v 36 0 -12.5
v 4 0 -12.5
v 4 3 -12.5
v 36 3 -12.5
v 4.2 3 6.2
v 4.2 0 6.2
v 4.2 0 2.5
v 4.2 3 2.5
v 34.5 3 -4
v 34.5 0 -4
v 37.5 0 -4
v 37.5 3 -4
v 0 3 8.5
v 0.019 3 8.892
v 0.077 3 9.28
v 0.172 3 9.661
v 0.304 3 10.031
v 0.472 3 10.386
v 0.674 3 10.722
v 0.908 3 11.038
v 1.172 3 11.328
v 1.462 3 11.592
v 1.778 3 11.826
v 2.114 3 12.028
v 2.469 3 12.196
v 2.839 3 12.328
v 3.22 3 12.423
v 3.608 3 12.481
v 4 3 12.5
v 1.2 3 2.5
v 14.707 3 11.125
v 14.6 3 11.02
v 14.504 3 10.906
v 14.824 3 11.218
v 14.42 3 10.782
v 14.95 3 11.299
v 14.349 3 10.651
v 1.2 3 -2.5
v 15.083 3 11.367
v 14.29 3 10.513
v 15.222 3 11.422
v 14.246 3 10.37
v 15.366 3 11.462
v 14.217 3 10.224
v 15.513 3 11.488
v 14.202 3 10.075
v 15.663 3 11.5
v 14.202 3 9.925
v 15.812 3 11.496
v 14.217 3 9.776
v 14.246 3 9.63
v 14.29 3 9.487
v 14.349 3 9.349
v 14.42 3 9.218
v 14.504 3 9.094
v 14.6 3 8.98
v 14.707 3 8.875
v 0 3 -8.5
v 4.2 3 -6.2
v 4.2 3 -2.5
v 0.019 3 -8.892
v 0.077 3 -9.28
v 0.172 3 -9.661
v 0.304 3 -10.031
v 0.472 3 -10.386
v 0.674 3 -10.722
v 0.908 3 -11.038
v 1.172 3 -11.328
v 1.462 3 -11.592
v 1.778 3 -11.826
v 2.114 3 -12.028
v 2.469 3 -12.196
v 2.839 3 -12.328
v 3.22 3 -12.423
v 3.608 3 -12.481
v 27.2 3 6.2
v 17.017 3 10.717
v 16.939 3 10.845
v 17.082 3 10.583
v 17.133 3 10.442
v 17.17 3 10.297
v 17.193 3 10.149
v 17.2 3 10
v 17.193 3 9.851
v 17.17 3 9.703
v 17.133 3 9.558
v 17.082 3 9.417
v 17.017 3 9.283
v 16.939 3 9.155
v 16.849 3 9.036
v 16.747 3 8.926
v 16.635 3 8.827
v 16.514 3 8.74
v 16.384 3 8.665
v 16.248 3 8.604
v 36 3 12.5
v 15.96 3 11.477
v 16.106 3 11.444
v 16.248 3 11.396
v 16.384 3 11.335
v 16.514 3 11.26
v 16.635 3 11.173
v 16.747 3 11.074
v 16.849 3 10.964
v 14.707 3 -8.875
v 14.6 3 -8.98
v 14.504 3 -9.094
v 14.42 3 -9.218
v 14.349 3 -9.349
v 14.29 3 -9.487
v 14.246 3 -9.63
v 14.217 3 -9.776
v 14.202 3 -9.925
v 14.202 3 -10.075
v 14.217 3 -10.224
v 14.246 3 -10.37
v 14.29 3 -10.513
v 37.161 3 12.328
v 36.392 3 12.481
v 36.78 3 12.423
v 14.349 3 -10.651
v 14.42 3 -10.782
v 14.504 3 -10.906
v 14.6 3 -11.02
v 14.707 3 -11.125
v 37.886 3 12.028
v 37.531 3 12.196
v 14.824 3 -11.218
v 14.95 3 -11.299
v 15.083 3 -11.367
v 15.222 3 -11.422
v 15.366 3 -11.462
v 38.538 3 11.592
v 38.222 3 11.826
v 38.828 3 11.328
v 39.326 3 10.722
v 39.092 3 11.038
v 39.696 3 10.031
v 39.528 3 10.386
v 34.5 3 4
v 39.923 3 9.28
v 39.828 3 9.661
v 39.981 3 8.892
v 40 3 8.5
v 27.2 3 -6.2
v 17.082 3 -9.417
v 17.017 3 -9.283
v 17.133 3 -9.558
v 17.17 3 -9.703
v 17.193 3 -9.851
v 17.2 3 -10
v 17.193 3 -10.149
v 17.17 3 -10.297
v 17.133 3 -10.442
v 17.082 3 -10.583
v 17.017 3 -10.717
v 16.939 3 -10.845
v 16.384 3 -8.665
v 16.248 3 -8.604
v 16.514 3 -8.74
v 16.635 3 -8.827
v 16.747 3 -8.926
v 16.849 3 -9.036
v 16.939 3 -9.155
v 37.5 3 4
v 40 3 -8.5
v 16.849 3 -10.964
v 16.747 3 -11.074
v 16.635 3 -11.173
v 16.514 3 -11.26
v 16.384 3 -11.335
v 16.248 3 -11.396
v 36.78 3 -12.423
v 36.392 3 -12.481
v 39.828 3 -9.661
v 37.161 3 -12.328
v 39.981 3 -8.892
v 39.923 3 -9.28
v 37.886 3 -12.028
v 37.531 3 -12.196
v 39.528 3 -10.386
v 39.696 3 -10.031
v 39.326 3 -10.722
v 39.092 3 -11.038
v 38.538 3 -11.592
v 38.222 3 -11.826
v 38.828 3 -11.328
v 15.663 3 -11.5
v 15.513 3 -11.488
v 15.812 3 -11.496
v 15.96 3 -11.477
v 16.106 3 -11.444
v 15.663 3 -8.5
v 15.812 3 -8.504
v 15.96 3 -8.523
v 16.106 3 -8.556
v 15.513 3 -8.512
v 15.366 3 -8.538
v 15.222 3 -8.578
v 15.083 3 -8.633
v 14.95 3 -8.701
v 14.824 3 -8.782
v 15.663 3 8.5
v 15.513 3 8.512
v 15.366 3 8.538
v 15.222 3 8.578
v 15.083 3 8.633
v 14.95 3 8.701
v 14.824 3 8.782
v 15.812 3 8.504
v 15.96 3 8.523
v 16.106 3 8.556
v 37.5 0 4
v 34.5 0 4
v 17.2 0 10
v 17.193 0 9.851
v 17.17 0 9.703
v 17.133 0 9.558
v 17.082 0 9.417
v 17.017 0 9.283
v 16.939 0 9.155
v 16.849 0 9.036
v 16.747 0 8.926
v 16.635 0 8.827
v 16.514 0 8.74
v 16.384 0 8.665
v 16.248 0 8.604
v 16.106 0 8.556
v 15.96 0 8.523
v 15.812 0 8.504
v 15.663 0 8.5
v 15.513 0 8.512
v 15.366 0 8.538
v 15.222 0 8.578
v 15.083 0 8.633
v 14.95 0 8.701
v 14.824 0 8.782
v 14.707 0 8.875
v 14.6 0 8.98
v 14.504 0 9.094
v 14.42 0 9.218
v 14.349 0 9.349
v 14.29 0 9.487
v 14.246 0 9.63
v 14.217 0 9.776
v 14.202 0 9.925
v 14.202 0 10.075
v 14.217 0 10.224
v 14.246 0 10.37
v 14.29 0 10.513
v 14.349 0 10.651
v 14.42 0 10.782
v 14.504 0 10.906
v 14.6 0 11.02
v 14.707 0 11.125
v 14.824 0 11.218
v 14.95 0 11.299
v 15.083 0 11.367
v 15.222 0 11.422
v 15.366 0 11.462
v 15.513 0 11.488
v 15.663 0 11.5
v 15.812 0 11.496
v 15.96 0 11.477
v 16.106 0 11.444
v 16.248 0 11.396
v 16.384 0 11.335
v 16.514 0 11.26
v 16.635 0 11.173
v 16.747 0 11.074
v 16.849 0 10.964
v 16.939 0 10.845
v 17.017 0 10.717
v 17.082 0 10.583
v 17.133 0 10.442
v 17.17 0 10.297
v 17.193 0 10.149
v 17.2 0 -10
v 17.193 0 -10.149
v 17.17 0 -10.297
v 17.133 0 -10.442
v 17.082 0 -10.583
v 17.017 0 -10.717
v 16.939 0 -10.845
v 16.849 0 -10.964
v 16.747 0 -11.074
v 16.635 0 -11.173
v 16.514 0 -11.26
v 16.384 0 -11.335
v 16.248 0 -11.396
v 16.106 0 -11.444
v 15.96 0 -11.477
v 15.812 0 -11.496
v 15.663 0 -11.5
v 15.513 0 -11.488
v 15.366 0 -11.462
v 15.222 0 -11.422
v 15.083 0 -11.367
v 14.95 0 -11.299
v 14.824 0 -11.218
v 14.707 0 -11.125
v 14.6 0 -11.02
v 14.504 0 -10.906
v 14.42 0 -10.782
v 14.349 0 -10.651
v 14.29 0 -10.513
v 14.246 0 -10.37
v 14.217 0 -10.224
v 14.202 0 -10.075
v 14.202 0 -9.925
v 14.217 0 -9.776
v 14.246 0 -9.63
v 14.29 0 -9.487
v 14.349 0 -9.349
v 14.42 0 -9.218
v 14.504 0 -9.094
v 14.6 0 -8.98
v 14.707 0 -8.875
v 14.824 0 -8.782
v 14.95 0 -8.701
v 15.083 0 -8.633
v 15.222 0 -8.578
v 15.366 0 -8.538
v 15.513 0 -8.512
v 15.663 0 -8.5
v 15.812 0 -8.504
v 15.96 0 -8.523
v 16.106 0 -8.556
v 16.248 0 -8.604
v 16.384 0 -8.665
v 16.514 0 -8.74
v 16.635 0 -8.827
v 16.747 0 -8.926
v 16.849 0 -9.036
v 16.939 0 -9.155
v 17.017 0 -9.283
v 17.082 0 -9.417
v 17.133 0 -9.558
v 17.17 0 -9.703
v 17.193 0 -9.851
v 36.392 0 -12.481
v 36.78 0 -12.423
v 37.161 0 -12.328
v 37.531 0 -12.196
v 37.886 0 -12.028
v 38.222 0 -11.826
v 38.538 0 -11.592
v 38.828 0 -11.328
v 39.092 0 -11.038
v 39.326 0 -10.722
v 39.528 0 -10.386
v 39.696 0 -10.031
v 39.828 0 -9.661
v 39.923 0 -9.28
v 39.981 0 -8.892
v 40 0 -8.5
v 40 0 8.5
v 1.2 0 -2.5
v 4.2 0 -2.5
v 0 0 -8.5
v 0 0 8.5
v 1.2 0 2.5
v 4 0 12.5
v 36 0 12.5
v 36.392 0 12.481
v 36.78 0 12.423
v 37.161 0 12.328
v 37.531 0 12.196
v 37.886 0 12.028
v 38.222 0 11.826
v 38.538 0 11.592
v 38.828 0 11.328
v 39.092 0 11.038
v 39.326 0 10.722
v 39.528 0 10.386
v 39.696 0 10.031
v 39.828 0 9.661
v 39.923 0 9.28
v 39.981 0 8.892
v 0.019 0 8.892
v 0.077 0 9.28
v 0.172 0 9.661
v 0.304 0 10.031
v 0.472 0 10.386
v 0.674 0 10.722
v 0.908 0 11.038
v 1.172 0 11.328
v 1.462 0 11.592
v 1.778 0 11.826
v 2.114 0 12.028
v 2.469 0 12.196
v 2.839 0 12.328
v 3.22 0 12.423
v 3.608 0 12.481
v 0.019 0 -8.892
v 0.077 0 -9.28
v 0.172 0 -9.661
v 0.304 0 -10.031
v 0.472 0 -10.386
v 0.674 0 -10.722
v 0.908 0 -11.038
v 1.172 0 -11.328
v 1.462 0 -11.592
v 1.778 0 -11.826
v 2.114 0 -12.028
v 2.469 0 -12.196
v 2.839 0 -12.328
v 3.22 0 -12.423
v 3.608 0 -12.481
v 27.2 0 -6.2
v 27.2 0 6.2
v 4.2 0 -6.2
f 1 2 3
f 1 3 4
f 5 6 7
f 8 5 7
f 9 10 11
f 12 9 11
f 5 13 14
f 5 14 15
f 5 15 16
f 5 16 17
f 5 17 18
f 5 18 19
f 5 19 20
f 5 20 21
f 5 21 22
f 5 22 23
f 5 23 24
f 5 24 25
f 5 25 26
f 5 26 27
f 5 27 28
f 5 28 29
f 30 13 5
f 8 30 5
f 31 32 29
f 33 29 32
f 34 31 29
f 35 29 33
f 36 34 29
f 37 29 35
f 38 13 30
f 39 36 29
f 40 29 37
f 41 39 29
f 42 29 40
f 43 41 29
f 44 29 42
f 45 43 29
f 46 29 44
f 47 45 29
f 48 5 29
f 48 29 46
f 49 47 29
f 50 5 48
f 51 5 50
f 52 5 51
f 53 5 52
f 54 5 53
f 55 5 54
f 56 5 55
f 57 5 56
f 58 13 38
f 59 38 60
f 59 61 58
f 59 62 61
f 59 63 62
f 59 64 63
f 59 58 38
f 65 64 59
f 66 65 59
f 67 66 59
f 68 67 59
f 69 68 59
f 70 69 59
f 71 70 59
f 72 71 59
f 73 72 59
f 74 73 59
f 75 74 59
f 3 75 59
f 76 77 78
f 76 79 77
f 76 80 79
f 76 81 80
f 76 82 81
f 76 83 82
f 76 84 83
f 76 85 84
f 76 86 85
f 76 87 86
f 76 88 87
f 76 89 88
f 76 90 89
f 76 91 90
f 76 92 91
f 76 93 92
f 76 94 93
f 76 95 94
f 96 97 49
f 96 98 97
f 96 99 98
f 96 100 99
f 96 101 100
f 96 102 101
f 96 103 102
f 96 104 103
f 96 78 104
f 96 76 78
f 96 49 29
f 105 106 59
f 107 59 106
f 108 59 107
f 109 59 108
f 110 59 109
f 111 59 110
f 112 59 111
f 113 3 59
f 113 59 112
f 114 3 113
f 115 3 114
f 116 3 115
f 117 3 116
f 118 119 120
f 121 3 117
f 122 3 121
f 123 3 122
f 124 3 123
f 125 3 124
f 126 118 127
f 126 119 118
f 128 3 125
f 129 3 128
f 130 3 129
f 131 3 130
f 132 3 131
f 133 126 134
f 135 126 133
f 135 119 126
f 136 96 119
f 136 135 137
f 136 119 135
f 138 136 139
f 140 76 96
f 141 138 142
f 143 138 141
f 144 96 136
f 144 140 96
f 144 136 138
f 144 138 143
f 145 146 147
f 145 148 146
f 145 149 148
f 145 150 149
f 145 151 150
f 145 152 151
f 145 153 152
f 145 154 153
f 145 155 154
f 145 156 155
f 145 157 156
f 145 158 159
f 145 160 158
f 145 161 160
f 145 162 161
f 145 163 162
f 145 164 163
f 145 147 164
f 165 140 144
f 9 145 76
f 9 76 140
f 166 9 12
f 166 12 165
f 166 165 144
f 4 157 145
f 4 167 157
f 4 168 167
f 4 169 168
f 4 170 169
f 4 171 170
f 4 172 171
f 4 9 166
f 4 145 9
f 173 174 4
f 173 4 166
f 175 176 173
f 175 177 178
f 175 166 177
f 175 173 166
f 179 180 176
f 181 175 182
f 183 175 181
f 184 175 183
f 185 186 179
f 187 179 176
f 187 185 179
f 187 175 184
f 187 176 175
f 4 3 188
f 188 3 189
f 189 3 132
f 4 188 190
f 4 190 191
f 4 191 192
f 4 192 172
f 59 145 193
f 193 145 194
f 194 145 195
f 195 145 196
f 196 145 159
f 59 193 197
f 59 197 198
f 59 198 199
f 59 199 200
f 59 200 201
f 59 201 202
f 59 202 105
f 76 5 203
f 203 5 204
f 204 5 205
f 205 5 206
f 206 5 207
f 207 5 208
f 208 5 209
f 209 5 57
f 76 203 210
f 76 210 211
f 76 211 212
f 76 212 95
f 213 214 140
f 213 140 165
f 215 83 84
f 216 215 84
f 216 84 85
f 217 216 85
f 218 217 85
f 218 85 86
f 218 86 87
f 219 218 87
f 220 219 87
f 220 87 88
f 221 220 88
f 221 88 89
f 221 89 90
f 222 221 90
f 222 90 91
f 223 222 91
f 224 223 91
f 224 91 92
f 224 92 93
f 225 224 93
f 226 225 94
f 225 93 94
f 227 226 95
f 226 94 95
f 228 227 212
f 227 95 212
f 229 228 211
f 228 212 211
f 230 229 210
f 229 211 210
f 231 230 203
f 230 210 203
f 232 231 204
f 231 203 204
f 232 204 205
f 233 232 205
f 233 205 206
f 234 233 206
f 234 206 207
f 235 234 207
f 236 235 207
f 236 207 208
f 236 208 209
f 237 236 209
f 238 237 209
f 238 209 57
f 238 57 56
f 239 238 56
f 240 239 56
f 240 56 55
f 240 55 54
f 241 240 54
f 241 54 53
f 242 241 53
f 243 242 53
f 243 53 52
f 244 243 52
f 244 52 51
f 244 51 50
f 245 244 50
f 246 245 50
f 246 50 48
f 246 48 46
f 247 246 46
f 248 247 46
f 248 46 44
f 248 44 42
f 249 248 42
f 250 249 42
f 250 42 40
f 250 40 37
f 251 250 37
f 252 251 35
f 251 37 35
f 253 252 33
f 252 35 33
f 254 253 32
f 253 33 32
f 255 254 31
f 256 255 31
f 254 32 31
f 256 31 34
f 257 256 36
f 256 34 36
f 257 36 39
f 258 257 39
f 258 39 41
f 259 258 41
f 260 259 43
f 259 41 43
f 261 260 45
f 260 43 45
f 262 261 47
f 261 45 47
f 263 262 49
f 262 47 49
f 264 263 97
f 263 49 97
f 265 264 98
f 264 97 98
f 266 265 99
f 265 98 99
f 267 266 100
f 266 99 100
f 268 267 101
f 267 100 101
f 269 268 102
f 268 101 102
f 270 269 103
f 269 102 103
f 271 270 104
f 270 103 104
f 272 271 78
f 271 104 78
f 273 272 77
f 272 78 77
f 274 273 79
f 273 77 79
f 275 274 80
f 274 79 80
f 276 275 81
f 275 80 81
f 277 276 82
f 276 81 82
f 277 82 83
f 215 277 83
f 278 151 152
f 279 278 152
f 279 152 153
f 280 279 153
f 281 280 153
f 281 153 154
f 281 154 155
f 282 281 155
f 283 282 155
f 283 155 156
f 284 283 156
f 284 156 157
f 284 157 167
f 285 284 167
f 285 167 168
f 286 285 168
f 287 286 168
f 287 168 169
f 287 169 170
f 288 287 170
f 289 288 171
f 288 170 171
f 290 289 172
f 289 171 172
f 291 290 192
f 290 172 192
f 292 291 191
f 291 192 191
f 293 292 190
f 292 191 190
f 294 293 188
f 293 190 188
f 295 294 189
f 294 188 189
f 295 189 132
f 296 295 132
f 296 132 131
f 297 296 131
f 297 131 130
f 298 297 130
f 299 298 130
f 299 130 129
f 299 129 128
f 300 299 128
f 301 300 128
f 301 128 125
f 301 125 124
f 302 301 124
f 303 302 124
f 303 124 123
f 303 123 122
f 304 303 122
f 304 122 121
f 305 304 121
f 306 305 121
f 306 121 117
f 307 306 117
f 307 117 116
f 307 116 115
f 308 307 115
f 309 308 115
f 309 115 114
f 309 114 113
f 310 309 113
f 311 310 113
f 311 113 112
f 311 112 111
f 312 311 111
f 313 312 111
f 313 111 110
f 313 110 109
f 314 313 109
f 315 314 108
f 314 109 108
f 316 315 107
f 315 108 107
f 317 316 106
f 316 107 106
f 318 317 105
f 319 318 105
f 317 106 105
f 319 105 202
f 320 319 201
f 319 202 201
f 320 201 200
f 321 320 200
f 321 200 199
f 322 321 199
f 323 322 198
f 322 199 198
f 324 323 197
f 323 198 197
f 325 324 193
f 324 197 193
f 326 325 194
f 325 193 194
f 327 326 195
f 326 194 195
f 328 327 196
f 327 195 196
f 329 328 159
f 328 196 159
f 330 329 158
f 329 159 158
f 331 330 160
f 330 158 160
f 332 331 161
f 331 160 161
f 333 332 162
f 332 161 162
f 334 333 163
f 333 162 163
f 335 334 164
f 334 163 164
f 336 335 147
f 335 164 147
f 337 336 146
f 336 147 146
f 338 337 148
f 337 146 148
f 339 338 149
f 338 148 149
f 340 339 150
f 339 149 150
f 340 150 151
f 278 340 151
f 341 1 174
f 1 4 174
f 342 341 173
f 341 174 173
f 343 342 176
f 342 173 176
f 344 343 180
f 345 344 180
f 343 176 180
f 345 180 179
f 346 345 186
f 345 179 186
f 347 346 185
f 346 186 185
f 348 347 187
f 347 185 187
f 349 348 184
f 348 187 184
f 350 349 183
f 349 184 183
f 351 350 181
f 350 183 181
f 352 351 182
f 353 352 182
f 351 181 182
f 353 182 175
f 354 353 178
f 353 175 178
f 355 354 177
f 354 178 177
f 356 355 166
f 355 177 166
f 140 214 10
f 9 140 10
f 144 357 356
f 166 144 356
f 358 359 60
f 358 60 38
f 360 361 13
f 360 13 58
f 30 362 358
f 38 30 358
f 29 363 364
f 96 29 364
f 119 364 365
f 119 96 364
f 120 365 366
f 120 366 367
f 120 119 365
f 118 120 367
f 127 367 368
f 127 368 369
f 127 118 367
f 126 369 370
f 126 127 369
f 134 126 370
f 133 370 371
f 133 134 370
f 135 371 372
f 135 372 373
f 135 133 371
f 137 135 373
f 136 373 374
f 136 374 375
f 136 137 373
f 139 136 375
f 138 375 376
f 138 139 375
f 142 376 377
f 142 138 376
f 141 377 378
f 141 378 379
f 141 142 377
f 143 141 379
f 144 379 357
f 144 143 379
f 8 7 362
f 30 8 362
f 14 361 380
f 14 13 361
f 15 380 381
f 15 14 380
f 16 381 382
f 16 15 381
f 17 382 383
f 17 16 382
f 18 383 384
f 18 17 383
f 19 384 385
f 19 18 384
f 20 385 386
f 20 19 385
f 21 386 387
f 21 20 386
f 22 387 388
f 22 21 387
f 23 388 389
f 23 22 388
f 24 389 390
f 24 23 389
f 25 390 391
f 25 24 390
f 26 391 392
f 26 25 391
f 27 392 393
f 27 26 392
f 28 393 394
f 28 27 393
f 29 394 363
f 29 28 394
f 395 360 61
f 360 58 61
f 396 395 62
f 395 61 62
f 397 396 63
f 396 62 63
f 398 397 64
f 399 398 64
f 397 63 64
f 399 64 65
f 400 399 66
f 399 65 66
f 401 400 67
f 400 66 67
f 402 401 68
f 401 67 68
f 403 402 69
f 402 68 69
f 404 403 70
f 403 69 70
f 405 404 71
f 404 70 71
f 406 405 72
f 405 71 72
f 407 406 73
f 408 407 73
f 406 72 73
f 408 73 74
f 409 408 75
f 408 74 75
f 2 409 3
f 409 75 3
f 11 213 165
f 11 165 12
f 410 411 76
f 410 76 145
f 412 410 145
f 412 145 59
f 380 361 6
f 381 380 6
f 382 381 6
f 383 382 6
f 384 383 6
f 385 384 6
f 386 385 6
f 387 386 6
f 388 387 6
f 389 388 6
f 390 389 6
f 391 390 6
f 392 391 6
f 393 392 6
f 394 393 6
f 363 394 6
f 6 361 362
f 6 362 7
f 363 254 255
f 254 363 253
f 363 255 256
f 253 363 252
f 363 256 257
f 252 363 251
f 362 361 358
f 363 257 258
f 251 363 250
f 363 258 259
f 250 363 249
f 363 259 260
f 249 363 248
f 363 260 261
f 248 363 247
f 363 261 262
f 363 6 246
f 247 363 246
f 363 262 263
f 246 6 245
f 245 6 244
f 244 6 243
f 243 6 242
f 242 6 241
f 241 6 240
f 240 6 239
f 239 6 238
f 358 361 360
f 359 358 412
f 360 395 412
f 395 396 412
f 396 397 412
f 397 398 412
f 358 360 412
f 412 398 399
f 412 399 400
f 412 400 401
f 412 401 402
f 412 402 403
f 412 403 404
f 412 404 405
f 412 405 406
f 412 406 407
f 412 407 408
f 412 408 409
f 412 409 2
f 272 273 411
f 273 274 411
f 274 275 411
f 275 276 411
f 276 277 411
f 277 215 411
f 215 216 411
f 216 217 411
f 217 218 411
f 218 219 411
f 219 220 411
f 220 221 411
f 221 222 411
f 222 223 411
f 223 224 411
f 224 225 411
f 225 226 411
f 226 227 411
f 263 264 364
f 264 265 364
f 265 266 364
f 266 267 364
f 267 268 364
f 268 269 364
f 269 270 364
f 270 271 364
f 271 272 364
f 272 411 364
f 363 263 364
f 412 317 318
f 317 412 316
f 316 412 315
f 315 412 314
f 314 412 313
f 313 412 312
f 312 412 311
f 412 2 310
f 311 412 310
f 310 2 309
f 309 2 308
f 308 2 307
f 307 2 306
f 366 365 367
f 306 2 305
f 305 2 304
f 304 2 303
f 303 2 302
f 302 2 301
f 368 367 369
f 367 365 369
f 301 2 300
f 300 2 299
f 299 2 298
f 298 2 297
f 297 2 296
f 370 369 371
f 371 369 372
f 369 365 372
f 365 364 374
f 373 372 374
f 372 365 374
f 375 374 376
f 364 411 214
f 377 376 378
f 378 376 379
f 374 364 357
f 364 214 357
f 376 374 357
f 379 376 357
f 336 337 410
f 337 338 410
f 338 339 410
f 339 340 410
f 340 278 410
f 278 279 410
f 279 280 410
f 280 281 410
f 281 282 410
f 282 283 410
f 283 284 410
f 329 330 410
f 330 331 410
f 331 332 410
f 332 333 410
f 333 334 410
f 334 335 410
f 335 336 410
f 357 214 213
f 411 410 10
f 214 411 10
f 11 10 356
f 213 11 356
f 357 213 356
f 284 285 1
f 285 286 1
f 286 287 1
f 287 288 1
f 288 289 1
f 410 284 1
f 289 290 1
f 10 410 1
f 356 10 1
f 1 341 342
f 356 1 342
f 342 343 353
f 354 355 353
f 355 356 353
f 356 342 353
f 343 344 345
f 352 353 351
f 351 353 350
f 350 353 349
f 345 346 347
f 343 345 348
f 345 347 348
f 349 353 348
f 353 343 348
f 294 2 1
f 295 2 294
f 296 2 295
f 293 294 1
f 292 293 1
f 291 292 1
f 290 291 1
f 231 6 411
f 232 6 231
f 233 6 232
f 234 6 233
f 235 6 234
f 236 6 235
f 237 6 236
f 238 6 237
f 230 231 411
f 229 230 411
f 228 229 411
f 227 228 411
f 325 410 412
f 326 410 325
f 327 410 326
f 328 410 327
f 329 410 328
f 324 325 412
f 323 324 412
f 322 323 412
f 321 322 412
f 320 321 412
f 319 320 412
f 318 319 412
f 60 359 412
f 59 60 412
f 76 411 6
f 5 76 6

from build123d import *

# Parameters (mm, degrees)
ESBO_O1_W                  = 40
ESBO_O1_H                  = 25
RESSALTO_EXTRUS_O1_DEPTH   = 3
ESBO_O7_W                  = 3
ESBO_O7_H                  = 8
CORTE_EXTRUS_O3_DEPTH      = 43.014878317
PERFIL_CORTE_W             = 23
PERFIL_CORTE_H             = 12.4
CORTE_PRINCIPAL_DEPTH      = 76.288119648
FURO_DE_DI_METRO_3_0_3_1_D = 3
ESBO_O6_W                  = 3
ESBO_O6_H                  = 5
CORTE_EXTRUS_O2_DEPTH      = 92.50164688
FILETE1_R                  = 4


with BuildPart() as part:
    # Esboço1 → Ressalto-extrusão1 (new body)
    with BuildSketch(Plane(origin=(0, 0, 0), x_dir=(1, 0, 0), z_dir=(0, 1, 0))):
        with Locations((20, 0)):
            Rectangle(ESBO_O1_W, ESBO_O1_H)
    extrude(amount=RESSALTO_EXTRUS_O1_DEPTH)

    # Esboço7 → Corte-extrusão3 (cut, through all)
    with BuildSketch(Plane(origin=(0, 0, 0), x_dir=(1, 0, 0), z_dir=(0, 1, 0))):
        with Locations((36, 0)):
            Rectangle(ESBO_O7_W, ESBO_O7_H)
    extrude(amount=CORTE_EXTRUS_O3_DEPTH, mode=Mode.SUBTRACT)

    # Perfil Corte → Corte Principal (cut, through all)
    with BuildSketch(Plane(origin=(62.223874948, 0, 29.778722149), x_dir=(-1, 0, 0), z_dir=(0, -1, 0))):
        with Locations((46.523874948, 29.778722149)):
            Rectangle(PERFIL_CORTE_W, PERFIL_CORTE_H)
    extrude(amount=-CORTE_PRINCIPAL_DEPTH, mode=Mode.SUBTRACT)

    # Furo de diâmetro Ø3.0 (3)1 (through all)
    with Locations(Plane(origin=(84.444031263, 0, 22.610638925), x_dir=(-1, 0, 0), z_dir=(0, -1, 0))):
        with Locations((68.744031263, 32.610638925), (68.744031263, 12.610638925)):
            Hole(FURO_DE_DI_METRO_3_0_3_1_D / 2)

    # Esboço6 → Corte-extrusão2 (cut, through all)
    with BuildSketch(Plane(origin=(84.444031263, 0, 22.610638925), x_dir=(-1, 0, 0), z_dir=(0, -1, 0))):
        with Locations((81.744031263, 22.610638925)):
            Rectangle(ESBO_O6_W, ESBO_O6_H)
    extrude(amount=-CORTE_EXTRUS_O2_DEPTH, mode=Mode.SUBTRACT)

    # Filete1
    filete1_edges = [part.edges().sort_by_distance(p)[0] for p in [
        (0, 1.5, -12.5),
        (40, 1.5, -12.5),
        (40, 1.5, 12.5),
        (0, 1.5, 12.5),
    ]]
    fillet(filete1_edges, radius=FILETE1_R)


solid = part.part
